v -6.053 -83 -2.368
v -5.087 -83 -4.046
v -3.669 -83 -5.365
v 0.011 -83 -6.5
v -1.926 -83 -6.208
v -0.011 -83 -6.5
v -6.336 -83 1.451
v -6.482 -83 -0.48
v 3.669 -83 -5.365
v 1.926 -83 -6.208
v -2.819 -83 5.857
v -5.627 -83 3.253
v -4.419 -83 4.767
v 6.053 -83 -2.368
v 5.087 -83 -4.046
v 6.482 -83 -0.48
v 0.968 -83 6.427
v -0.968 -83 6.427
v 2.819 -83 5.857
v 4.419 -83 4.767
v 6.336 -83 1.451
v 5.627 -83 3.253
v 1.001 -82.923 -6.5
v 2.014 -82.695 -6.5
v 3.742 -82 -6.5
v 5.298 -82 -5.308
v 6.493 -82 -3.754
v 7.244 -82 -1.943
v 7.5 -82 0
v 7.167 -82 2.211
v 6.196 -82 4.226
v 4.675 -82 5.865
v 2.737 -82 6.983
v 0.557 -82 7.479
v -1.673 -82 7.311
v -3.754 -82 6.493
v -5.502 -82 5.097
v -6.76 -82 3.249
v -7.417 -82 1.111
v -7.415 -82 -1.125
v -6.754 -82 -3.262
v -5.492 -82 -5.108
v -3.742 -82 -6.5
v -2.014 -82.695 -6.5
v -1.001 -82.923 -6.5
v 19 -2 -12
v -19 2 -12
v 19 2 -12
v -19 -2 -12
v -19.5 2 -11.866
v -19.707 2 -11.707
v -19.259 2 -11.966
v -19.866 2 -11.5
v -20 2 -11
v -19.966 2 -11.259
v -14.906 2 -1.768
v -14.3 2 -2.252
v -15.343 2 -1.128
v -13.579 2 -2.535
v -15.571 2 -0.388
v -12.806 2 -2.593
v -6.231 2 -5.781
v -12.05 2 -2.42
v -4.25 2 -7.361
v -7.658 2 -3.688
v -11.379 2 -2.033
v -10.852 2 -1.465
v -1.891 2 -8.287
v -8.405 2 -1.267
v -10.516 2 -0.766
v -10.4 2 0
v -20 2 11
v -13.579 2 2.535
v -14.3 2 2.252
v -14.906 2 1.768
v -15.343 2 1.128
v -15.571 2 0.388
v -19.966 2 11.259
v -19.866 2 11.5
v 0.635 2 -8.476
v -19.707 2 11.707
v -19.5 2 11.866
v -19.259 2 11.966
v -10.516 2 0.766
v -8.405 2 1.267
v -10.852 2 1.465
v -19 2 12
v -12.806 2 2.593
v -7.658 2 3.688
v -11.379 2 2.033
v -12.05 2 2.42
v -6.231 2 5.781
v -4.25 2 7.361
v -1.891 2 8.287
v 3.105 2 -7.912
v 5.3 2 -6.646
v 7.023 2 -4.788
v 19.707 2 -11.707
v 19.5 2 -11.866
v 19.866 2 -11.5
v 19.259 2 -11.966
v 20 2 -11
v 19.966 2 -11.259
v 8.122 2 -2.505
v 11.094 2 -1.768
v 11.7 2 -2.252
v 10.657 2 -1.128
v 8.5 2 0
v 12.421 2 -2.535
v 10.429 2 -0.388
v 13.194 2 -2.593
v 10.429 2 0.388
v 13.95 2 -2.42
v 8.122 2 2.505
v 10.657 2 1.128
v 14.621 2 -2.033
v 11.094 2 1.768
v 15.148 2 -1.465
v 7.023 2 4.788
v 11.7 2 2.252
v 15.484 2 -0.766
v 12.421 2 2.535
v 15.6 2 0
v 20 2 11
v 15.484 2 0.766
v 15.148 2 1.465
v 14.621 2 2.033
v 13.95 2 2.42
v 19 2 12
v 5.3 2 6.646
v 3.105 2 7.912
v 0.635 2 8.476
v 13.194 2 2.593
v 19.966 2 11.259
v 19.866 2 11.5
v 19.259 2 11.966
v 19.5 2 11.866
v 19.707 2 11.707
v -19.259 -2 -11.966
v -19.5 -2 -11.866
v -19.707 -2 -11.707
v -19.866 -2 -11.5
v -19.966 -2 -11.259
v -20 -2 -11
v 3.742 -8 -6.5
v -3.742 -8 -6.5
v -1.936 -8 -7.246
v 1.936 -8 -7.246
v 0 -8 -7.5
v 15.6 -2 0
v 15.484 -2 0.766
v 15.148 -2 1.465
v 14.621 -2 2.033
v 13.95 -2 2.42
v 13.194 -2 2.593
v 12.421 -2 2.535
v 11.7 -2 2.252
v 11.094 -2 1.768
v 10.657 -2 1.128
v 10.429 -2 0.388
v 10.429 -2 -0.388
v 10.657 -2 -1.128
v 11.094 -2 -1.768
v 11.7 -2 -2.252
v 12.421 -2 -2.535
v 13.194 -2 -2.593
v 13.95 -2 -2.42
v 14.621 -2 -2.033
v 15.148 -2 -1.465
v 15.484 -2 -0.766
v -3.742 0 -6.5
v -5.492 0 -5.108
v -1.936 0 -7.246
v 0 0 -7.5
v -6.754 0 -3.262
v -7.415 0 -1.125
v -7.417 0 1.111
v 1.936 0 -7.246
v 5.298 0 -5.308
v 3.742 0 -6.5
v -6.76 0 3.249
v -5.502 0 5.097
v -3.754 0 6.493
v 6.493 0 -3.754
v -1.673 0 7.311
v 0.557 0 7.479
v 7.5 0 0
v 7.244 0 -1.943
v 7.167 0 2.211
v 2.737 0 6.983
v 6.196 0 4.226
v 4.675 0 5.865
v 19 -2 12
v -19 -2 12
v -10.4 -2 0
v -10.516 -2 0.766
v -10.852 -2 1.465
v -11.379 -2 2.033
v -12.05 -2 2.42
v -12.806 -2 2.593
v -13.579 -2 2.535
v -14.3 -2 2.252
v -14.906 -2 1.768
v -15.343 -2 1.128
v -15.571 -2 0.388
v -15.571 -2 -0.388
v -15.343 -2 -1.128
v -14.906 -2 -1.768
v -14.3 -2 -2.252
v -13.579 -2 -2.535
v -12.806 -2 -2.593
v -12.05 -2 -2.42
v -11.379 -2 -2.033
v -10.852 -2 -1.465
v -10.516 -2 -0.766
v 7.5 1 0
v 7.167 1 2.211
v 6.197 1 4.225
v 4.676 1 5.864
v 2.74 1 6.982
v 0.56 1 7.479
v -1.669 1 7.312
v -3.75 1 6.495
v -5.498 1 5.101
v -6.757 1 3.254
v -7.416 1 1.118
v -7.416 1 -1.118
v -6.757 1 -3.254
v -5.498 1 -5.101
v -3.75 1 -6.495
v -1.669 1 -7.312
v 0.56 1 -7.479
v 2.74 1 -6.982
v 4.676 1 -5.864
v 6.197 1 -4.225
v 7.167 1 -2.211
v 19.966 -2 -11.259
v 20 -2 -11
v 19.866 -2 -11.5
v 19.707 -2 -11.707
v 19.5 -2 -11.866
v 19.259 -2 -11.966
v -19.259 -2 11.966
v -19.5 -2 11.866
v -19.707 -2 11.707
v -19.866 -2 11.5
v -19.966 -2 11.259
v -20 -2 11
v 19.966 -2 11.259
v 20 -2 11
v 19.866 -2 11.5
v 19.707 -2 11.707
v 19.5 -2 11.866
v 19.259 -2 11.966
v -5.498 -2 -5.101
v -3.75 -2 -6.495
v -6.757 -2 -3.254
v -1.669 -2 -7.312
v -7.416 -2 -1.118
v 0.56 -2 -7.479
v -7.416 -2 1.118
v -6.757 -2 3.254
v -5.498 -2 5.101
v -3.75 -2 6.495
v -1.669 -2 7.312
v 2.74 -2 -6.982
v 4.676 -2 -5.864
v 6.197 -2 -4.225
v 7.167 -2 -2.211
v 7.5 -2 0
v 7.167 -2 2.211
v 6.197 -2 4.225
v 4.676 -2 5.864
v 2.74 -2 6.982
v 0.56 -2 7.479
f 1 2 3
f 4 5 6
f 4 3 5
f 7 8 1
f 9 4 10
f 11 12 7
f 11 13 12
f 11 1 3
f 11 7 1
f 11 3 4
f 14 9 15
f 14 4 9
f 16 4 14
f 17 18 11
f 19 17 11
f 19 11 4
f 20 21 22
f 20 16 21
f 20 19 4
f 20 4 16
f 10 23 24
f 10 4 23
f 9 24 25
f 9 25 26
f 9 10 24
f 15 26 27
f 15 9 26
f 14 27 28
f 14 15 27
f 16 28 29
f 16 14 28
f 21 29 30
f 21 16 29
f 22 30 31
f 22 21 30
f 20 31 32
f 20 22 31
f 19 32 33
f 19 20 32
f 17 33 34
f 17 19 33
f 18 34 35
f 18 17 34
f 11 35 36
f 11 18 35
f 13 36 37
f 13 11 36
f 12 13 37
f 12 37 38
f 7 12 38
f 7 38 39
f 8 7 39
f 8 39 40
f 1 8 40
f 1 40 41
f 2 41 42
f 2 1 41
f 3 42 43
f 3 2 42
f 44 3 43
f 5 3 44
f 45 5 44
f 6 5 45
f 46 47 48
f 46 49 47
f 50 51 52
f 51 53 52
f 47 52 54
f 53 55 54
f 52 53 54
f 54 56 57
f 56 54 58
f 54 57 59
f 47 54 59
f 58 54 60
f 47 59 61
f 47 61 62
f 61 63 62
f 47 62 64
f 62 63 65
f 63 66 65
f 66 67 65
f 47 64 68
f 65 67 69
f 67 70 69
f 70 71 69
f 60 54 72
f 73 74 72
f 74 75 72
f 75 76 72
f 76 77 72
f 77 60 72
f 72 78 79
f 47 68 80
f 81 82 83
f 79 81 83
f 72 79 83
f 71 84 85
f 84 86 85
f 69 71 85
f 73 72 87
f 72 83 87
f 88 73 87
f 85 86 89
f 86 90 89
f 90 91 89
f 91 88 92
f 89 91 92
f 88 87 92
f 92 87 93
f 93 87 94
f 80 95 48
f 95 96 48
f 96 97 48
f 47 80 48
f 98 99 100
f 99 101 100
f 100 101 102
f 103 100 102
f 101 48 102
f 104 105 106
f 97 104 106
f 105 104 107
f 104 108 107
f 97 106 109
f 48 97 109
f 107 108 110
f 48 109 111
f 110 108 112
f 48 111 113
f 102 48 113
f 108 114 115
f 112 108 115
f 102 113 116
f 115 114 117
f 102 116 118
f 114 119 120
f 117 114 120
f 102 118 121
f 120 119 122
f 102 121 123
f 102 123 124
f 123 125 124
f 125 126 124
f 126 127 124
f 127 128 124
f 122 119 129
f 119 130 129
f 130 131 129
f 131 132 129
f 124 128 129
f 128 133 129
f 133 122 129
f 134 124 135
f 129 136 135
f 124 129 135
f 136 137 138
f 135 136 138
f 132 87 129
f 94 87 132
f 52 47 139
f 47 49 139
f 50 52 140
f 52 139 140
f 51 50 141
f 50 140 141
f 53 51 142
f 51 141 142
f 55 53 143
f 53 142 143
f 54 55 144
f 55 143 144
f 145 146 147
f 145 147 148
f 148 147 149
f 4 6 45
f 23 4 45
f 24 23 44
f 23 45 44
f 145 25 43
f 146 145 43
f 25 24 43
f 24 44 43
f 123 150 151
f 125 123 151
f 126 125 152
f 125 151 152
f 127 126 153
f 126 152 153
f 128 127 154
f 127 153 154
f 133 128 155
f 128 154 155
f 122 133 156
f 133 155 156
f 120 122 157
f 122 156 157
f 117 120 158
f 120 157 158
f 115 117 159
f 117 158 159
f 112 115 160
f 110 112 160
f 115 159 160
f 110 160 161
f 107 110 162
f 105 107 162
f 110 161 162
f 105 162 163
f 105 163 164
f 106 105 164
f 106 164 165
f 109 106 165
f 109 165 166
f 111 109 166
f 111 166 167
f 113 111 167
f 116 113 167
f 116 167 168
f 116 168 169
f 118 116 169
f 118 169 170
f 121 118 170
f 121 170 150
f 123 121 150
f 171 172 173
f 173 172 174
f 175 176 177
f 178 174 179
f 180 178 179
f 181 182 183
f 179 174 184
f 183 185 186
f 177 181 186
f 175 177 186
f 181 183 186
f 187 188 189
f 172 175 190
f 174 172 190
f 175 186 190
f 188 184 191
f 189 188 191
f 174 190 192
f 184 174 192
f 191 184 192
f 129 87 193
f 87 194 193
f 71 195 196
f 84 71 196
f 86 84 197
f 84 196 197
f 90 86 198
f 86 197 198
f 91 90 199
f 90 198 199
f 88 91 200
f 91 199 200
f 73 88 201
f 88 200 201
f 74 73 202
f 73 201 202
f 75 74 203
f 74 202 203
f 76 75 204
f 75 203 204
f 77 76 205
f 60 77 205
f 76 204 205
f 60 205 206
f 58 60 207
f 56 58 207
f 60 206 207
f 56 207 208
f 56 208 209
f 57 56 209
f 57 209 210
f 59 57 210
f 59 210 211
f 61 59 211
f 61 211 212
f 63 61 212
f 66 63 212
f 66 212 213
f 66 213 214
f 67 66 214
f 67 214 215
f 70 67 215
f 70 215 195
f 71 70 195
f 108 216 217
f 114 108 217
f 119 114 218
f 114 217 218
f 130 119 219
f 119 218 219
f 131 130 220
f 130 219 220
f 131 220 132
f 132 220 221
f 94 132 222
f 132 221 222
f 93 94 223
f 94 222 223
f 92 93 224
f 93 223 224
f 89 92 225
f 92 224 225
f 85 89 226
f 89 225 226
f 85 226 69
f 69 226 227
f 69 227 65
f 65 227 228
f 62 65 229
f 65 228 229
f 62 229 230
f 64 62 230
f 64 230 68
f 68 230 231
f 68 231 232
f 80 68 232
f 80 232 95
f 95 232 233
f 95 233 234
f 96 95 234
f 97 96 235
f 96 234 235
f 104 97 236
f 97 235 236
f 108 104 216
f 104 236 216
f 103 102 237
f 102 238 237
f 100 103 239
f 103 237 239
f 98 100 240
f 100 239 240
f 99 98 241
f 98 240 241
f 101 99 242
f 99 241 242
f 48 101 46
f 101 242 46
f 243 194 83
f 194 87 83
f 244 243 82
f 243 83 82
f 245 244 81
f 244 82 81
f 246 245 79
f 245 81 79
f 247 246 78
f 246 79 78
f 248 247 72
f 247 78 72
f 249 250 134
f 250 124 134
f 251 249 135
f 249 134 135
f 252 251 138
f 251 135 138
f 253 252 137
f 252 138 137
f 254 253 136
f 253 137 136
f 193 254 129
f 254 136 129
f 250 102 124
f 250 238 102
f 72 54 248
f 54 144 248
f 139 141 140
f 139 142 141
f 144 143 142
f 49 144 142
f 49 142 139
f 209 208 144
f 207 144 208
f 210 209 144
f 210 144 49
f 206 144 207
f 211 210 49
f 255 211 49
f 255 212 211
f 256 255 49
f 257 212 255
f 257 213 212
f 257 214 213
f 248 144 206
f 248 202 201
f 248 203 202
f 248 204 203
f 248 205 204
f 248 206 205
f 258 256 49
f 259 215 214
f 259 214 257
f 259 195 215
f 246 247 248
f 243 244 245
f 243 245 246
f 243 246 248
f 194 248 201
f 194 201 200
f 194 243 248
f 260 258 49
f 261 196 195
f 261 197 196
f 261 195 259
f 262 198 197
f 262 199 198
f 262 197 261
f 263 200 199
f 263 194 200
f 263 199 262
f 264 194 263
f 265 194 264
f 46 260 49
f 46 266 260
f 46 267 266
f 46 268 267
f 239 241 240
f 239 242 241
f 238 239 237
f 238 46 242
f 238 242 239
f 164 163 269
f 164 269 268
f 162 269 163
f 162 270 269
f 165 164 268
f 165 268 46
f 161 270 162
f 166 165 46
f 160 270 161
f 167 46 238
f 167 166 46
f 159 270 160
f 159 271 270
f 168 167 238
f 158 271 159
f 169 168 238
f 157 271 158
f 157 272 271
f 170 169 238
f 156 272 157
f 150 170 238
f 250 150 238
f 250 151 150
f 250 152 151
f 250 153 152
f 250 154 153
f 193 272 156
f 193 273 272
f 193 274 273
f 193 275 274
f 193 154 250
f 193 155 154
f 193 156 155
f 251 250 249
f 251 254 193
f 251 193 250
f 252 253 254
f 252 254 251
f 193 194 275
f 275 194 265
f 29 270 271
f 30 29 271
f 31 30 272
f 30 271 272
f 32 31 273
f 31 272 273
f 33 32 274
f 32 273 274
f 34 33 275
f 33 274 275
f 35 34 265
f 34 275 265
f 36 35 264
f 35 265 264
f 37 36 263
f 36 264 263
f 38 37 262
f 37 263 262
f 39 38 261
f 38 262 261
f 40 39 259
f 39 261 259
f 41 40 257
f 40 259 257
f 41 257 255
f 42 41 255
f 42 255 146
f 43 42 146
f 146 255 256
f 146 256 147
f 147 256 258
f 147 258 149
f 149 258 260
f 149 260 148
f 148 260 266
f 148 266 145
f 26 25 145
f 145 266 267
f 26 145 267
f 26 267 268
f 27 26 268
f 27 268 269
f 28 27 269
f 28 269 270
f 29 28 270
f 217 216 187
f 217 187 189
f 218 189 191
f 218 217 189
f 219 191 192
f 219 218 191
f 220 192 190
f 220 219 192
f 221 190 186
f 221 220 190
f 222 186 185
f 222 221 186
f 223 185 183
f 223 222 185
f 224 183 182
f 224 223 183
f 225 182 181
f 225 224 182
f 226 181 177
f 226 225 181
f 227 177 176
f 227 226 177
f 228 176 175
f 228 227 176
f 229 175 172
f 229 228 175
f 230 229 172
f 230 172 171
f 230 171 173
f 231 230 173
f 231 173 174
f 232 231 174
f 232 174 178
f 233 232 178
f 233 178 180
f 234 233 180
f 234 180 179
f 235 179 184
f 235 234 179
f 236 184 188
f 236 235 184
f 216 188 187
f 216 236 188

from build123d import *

# Parameters (mm, degrees)
F0_W     = 40
F0_H     = 24
F0_R     = 7.5
F1_DEPTH = 2
F2_DEPTH = 83
F4_D     = 5.2
F4_DEPTH = 15
F4_TIP   = 1.5622376095
F6_DEPTH = 75
F8_DEPTH = 75
F9_SIZE  = 0.99999
F10_R    = 1


# Not quite as in the source:
# - a fillet or chamfer is up to 0.001 mm smaller than in the source, because OpenCascade refuses the exact size


with BuildPart() as f1:
    # F0 (on Front) → F1 (new body, symmetric)
    with BuildSketch(Plane.XZ):
        Rectangle(F0_W, F0_H)
        Circle(F0_R, mode=Mode.SUBTRACT)
    extrude(amount=F1_DEPTH, both=True)

    # F0 (on Front) → F2 (join)
    with BuildSketch(Plane.XZ):
        Circle(F0_R)
    extrude(amount=F2_DEPTH)

    # F4
    with Locations(Plane(origin=(0, 2, 0), x_dir=(-1, 0, 0), z_dir=(0, 1, 0))):
        with Locations((-13, 0), (13, 0)):
            Hole(F4_D / 2, depth=F4_DEPTH)
            with Locations((0, 0, -(F4_DEPTH + F4_TIP / 2))):  # 118° drill point
                Cone(0, F4_D / 2, F4_TIP, mode=Mode.SUBTRACT)

    # F5 (on Front) → F6 (cut)
    with BuildSketch(Plane.XZ):
        with BuildLine():
            Line((3.7416573868, -6.5), (-3.7416573868, -6.5))
            ThreePointArc((-3.7416573868, -6.5), (0, -7.5), (3.7416573868, -6.5))
        make_face()
    extrude(amount=-F6_DEPTH, mode=Mode.SUBTRACT)

    # F7 (on face) → F8 (cut)
    with BuildSketch(Plane.XZ.offset(83)):
        with BuildLine():
            ThreePointArc((-3.7416573868, -6.5), (0, -7.5), (3.7416573868, -6.5))
            Line((3.7416573868, -6.5), (-3.7416573868, -6.5))
        make_face()
    extrude(amount=-F8_DEPTH, mode=Mode.SUBTRACT)

    # F9 (size 1 in the source; OpenCascade refuses exactly that, so slightly less here)
    f9_edges = [f1.edges().sort_by_distance(p)[0] for p in [
        (-7.5, 2, 0),
        (-3.754169, -83, 6.492782),
    ]]
    chamfer(f9_edges, length=F9_SIZE)

    # F10
    f10_edges = [f1.edges().sort_by_distance(p)[0] for p in [
        (20, 0, 12),
        (-20, 0, 12),
        (20, 0, -12),
        (-20, 0, -12),
    ]]
    fillet(f10_edges, radius=F10_R)


solid = f1.part
